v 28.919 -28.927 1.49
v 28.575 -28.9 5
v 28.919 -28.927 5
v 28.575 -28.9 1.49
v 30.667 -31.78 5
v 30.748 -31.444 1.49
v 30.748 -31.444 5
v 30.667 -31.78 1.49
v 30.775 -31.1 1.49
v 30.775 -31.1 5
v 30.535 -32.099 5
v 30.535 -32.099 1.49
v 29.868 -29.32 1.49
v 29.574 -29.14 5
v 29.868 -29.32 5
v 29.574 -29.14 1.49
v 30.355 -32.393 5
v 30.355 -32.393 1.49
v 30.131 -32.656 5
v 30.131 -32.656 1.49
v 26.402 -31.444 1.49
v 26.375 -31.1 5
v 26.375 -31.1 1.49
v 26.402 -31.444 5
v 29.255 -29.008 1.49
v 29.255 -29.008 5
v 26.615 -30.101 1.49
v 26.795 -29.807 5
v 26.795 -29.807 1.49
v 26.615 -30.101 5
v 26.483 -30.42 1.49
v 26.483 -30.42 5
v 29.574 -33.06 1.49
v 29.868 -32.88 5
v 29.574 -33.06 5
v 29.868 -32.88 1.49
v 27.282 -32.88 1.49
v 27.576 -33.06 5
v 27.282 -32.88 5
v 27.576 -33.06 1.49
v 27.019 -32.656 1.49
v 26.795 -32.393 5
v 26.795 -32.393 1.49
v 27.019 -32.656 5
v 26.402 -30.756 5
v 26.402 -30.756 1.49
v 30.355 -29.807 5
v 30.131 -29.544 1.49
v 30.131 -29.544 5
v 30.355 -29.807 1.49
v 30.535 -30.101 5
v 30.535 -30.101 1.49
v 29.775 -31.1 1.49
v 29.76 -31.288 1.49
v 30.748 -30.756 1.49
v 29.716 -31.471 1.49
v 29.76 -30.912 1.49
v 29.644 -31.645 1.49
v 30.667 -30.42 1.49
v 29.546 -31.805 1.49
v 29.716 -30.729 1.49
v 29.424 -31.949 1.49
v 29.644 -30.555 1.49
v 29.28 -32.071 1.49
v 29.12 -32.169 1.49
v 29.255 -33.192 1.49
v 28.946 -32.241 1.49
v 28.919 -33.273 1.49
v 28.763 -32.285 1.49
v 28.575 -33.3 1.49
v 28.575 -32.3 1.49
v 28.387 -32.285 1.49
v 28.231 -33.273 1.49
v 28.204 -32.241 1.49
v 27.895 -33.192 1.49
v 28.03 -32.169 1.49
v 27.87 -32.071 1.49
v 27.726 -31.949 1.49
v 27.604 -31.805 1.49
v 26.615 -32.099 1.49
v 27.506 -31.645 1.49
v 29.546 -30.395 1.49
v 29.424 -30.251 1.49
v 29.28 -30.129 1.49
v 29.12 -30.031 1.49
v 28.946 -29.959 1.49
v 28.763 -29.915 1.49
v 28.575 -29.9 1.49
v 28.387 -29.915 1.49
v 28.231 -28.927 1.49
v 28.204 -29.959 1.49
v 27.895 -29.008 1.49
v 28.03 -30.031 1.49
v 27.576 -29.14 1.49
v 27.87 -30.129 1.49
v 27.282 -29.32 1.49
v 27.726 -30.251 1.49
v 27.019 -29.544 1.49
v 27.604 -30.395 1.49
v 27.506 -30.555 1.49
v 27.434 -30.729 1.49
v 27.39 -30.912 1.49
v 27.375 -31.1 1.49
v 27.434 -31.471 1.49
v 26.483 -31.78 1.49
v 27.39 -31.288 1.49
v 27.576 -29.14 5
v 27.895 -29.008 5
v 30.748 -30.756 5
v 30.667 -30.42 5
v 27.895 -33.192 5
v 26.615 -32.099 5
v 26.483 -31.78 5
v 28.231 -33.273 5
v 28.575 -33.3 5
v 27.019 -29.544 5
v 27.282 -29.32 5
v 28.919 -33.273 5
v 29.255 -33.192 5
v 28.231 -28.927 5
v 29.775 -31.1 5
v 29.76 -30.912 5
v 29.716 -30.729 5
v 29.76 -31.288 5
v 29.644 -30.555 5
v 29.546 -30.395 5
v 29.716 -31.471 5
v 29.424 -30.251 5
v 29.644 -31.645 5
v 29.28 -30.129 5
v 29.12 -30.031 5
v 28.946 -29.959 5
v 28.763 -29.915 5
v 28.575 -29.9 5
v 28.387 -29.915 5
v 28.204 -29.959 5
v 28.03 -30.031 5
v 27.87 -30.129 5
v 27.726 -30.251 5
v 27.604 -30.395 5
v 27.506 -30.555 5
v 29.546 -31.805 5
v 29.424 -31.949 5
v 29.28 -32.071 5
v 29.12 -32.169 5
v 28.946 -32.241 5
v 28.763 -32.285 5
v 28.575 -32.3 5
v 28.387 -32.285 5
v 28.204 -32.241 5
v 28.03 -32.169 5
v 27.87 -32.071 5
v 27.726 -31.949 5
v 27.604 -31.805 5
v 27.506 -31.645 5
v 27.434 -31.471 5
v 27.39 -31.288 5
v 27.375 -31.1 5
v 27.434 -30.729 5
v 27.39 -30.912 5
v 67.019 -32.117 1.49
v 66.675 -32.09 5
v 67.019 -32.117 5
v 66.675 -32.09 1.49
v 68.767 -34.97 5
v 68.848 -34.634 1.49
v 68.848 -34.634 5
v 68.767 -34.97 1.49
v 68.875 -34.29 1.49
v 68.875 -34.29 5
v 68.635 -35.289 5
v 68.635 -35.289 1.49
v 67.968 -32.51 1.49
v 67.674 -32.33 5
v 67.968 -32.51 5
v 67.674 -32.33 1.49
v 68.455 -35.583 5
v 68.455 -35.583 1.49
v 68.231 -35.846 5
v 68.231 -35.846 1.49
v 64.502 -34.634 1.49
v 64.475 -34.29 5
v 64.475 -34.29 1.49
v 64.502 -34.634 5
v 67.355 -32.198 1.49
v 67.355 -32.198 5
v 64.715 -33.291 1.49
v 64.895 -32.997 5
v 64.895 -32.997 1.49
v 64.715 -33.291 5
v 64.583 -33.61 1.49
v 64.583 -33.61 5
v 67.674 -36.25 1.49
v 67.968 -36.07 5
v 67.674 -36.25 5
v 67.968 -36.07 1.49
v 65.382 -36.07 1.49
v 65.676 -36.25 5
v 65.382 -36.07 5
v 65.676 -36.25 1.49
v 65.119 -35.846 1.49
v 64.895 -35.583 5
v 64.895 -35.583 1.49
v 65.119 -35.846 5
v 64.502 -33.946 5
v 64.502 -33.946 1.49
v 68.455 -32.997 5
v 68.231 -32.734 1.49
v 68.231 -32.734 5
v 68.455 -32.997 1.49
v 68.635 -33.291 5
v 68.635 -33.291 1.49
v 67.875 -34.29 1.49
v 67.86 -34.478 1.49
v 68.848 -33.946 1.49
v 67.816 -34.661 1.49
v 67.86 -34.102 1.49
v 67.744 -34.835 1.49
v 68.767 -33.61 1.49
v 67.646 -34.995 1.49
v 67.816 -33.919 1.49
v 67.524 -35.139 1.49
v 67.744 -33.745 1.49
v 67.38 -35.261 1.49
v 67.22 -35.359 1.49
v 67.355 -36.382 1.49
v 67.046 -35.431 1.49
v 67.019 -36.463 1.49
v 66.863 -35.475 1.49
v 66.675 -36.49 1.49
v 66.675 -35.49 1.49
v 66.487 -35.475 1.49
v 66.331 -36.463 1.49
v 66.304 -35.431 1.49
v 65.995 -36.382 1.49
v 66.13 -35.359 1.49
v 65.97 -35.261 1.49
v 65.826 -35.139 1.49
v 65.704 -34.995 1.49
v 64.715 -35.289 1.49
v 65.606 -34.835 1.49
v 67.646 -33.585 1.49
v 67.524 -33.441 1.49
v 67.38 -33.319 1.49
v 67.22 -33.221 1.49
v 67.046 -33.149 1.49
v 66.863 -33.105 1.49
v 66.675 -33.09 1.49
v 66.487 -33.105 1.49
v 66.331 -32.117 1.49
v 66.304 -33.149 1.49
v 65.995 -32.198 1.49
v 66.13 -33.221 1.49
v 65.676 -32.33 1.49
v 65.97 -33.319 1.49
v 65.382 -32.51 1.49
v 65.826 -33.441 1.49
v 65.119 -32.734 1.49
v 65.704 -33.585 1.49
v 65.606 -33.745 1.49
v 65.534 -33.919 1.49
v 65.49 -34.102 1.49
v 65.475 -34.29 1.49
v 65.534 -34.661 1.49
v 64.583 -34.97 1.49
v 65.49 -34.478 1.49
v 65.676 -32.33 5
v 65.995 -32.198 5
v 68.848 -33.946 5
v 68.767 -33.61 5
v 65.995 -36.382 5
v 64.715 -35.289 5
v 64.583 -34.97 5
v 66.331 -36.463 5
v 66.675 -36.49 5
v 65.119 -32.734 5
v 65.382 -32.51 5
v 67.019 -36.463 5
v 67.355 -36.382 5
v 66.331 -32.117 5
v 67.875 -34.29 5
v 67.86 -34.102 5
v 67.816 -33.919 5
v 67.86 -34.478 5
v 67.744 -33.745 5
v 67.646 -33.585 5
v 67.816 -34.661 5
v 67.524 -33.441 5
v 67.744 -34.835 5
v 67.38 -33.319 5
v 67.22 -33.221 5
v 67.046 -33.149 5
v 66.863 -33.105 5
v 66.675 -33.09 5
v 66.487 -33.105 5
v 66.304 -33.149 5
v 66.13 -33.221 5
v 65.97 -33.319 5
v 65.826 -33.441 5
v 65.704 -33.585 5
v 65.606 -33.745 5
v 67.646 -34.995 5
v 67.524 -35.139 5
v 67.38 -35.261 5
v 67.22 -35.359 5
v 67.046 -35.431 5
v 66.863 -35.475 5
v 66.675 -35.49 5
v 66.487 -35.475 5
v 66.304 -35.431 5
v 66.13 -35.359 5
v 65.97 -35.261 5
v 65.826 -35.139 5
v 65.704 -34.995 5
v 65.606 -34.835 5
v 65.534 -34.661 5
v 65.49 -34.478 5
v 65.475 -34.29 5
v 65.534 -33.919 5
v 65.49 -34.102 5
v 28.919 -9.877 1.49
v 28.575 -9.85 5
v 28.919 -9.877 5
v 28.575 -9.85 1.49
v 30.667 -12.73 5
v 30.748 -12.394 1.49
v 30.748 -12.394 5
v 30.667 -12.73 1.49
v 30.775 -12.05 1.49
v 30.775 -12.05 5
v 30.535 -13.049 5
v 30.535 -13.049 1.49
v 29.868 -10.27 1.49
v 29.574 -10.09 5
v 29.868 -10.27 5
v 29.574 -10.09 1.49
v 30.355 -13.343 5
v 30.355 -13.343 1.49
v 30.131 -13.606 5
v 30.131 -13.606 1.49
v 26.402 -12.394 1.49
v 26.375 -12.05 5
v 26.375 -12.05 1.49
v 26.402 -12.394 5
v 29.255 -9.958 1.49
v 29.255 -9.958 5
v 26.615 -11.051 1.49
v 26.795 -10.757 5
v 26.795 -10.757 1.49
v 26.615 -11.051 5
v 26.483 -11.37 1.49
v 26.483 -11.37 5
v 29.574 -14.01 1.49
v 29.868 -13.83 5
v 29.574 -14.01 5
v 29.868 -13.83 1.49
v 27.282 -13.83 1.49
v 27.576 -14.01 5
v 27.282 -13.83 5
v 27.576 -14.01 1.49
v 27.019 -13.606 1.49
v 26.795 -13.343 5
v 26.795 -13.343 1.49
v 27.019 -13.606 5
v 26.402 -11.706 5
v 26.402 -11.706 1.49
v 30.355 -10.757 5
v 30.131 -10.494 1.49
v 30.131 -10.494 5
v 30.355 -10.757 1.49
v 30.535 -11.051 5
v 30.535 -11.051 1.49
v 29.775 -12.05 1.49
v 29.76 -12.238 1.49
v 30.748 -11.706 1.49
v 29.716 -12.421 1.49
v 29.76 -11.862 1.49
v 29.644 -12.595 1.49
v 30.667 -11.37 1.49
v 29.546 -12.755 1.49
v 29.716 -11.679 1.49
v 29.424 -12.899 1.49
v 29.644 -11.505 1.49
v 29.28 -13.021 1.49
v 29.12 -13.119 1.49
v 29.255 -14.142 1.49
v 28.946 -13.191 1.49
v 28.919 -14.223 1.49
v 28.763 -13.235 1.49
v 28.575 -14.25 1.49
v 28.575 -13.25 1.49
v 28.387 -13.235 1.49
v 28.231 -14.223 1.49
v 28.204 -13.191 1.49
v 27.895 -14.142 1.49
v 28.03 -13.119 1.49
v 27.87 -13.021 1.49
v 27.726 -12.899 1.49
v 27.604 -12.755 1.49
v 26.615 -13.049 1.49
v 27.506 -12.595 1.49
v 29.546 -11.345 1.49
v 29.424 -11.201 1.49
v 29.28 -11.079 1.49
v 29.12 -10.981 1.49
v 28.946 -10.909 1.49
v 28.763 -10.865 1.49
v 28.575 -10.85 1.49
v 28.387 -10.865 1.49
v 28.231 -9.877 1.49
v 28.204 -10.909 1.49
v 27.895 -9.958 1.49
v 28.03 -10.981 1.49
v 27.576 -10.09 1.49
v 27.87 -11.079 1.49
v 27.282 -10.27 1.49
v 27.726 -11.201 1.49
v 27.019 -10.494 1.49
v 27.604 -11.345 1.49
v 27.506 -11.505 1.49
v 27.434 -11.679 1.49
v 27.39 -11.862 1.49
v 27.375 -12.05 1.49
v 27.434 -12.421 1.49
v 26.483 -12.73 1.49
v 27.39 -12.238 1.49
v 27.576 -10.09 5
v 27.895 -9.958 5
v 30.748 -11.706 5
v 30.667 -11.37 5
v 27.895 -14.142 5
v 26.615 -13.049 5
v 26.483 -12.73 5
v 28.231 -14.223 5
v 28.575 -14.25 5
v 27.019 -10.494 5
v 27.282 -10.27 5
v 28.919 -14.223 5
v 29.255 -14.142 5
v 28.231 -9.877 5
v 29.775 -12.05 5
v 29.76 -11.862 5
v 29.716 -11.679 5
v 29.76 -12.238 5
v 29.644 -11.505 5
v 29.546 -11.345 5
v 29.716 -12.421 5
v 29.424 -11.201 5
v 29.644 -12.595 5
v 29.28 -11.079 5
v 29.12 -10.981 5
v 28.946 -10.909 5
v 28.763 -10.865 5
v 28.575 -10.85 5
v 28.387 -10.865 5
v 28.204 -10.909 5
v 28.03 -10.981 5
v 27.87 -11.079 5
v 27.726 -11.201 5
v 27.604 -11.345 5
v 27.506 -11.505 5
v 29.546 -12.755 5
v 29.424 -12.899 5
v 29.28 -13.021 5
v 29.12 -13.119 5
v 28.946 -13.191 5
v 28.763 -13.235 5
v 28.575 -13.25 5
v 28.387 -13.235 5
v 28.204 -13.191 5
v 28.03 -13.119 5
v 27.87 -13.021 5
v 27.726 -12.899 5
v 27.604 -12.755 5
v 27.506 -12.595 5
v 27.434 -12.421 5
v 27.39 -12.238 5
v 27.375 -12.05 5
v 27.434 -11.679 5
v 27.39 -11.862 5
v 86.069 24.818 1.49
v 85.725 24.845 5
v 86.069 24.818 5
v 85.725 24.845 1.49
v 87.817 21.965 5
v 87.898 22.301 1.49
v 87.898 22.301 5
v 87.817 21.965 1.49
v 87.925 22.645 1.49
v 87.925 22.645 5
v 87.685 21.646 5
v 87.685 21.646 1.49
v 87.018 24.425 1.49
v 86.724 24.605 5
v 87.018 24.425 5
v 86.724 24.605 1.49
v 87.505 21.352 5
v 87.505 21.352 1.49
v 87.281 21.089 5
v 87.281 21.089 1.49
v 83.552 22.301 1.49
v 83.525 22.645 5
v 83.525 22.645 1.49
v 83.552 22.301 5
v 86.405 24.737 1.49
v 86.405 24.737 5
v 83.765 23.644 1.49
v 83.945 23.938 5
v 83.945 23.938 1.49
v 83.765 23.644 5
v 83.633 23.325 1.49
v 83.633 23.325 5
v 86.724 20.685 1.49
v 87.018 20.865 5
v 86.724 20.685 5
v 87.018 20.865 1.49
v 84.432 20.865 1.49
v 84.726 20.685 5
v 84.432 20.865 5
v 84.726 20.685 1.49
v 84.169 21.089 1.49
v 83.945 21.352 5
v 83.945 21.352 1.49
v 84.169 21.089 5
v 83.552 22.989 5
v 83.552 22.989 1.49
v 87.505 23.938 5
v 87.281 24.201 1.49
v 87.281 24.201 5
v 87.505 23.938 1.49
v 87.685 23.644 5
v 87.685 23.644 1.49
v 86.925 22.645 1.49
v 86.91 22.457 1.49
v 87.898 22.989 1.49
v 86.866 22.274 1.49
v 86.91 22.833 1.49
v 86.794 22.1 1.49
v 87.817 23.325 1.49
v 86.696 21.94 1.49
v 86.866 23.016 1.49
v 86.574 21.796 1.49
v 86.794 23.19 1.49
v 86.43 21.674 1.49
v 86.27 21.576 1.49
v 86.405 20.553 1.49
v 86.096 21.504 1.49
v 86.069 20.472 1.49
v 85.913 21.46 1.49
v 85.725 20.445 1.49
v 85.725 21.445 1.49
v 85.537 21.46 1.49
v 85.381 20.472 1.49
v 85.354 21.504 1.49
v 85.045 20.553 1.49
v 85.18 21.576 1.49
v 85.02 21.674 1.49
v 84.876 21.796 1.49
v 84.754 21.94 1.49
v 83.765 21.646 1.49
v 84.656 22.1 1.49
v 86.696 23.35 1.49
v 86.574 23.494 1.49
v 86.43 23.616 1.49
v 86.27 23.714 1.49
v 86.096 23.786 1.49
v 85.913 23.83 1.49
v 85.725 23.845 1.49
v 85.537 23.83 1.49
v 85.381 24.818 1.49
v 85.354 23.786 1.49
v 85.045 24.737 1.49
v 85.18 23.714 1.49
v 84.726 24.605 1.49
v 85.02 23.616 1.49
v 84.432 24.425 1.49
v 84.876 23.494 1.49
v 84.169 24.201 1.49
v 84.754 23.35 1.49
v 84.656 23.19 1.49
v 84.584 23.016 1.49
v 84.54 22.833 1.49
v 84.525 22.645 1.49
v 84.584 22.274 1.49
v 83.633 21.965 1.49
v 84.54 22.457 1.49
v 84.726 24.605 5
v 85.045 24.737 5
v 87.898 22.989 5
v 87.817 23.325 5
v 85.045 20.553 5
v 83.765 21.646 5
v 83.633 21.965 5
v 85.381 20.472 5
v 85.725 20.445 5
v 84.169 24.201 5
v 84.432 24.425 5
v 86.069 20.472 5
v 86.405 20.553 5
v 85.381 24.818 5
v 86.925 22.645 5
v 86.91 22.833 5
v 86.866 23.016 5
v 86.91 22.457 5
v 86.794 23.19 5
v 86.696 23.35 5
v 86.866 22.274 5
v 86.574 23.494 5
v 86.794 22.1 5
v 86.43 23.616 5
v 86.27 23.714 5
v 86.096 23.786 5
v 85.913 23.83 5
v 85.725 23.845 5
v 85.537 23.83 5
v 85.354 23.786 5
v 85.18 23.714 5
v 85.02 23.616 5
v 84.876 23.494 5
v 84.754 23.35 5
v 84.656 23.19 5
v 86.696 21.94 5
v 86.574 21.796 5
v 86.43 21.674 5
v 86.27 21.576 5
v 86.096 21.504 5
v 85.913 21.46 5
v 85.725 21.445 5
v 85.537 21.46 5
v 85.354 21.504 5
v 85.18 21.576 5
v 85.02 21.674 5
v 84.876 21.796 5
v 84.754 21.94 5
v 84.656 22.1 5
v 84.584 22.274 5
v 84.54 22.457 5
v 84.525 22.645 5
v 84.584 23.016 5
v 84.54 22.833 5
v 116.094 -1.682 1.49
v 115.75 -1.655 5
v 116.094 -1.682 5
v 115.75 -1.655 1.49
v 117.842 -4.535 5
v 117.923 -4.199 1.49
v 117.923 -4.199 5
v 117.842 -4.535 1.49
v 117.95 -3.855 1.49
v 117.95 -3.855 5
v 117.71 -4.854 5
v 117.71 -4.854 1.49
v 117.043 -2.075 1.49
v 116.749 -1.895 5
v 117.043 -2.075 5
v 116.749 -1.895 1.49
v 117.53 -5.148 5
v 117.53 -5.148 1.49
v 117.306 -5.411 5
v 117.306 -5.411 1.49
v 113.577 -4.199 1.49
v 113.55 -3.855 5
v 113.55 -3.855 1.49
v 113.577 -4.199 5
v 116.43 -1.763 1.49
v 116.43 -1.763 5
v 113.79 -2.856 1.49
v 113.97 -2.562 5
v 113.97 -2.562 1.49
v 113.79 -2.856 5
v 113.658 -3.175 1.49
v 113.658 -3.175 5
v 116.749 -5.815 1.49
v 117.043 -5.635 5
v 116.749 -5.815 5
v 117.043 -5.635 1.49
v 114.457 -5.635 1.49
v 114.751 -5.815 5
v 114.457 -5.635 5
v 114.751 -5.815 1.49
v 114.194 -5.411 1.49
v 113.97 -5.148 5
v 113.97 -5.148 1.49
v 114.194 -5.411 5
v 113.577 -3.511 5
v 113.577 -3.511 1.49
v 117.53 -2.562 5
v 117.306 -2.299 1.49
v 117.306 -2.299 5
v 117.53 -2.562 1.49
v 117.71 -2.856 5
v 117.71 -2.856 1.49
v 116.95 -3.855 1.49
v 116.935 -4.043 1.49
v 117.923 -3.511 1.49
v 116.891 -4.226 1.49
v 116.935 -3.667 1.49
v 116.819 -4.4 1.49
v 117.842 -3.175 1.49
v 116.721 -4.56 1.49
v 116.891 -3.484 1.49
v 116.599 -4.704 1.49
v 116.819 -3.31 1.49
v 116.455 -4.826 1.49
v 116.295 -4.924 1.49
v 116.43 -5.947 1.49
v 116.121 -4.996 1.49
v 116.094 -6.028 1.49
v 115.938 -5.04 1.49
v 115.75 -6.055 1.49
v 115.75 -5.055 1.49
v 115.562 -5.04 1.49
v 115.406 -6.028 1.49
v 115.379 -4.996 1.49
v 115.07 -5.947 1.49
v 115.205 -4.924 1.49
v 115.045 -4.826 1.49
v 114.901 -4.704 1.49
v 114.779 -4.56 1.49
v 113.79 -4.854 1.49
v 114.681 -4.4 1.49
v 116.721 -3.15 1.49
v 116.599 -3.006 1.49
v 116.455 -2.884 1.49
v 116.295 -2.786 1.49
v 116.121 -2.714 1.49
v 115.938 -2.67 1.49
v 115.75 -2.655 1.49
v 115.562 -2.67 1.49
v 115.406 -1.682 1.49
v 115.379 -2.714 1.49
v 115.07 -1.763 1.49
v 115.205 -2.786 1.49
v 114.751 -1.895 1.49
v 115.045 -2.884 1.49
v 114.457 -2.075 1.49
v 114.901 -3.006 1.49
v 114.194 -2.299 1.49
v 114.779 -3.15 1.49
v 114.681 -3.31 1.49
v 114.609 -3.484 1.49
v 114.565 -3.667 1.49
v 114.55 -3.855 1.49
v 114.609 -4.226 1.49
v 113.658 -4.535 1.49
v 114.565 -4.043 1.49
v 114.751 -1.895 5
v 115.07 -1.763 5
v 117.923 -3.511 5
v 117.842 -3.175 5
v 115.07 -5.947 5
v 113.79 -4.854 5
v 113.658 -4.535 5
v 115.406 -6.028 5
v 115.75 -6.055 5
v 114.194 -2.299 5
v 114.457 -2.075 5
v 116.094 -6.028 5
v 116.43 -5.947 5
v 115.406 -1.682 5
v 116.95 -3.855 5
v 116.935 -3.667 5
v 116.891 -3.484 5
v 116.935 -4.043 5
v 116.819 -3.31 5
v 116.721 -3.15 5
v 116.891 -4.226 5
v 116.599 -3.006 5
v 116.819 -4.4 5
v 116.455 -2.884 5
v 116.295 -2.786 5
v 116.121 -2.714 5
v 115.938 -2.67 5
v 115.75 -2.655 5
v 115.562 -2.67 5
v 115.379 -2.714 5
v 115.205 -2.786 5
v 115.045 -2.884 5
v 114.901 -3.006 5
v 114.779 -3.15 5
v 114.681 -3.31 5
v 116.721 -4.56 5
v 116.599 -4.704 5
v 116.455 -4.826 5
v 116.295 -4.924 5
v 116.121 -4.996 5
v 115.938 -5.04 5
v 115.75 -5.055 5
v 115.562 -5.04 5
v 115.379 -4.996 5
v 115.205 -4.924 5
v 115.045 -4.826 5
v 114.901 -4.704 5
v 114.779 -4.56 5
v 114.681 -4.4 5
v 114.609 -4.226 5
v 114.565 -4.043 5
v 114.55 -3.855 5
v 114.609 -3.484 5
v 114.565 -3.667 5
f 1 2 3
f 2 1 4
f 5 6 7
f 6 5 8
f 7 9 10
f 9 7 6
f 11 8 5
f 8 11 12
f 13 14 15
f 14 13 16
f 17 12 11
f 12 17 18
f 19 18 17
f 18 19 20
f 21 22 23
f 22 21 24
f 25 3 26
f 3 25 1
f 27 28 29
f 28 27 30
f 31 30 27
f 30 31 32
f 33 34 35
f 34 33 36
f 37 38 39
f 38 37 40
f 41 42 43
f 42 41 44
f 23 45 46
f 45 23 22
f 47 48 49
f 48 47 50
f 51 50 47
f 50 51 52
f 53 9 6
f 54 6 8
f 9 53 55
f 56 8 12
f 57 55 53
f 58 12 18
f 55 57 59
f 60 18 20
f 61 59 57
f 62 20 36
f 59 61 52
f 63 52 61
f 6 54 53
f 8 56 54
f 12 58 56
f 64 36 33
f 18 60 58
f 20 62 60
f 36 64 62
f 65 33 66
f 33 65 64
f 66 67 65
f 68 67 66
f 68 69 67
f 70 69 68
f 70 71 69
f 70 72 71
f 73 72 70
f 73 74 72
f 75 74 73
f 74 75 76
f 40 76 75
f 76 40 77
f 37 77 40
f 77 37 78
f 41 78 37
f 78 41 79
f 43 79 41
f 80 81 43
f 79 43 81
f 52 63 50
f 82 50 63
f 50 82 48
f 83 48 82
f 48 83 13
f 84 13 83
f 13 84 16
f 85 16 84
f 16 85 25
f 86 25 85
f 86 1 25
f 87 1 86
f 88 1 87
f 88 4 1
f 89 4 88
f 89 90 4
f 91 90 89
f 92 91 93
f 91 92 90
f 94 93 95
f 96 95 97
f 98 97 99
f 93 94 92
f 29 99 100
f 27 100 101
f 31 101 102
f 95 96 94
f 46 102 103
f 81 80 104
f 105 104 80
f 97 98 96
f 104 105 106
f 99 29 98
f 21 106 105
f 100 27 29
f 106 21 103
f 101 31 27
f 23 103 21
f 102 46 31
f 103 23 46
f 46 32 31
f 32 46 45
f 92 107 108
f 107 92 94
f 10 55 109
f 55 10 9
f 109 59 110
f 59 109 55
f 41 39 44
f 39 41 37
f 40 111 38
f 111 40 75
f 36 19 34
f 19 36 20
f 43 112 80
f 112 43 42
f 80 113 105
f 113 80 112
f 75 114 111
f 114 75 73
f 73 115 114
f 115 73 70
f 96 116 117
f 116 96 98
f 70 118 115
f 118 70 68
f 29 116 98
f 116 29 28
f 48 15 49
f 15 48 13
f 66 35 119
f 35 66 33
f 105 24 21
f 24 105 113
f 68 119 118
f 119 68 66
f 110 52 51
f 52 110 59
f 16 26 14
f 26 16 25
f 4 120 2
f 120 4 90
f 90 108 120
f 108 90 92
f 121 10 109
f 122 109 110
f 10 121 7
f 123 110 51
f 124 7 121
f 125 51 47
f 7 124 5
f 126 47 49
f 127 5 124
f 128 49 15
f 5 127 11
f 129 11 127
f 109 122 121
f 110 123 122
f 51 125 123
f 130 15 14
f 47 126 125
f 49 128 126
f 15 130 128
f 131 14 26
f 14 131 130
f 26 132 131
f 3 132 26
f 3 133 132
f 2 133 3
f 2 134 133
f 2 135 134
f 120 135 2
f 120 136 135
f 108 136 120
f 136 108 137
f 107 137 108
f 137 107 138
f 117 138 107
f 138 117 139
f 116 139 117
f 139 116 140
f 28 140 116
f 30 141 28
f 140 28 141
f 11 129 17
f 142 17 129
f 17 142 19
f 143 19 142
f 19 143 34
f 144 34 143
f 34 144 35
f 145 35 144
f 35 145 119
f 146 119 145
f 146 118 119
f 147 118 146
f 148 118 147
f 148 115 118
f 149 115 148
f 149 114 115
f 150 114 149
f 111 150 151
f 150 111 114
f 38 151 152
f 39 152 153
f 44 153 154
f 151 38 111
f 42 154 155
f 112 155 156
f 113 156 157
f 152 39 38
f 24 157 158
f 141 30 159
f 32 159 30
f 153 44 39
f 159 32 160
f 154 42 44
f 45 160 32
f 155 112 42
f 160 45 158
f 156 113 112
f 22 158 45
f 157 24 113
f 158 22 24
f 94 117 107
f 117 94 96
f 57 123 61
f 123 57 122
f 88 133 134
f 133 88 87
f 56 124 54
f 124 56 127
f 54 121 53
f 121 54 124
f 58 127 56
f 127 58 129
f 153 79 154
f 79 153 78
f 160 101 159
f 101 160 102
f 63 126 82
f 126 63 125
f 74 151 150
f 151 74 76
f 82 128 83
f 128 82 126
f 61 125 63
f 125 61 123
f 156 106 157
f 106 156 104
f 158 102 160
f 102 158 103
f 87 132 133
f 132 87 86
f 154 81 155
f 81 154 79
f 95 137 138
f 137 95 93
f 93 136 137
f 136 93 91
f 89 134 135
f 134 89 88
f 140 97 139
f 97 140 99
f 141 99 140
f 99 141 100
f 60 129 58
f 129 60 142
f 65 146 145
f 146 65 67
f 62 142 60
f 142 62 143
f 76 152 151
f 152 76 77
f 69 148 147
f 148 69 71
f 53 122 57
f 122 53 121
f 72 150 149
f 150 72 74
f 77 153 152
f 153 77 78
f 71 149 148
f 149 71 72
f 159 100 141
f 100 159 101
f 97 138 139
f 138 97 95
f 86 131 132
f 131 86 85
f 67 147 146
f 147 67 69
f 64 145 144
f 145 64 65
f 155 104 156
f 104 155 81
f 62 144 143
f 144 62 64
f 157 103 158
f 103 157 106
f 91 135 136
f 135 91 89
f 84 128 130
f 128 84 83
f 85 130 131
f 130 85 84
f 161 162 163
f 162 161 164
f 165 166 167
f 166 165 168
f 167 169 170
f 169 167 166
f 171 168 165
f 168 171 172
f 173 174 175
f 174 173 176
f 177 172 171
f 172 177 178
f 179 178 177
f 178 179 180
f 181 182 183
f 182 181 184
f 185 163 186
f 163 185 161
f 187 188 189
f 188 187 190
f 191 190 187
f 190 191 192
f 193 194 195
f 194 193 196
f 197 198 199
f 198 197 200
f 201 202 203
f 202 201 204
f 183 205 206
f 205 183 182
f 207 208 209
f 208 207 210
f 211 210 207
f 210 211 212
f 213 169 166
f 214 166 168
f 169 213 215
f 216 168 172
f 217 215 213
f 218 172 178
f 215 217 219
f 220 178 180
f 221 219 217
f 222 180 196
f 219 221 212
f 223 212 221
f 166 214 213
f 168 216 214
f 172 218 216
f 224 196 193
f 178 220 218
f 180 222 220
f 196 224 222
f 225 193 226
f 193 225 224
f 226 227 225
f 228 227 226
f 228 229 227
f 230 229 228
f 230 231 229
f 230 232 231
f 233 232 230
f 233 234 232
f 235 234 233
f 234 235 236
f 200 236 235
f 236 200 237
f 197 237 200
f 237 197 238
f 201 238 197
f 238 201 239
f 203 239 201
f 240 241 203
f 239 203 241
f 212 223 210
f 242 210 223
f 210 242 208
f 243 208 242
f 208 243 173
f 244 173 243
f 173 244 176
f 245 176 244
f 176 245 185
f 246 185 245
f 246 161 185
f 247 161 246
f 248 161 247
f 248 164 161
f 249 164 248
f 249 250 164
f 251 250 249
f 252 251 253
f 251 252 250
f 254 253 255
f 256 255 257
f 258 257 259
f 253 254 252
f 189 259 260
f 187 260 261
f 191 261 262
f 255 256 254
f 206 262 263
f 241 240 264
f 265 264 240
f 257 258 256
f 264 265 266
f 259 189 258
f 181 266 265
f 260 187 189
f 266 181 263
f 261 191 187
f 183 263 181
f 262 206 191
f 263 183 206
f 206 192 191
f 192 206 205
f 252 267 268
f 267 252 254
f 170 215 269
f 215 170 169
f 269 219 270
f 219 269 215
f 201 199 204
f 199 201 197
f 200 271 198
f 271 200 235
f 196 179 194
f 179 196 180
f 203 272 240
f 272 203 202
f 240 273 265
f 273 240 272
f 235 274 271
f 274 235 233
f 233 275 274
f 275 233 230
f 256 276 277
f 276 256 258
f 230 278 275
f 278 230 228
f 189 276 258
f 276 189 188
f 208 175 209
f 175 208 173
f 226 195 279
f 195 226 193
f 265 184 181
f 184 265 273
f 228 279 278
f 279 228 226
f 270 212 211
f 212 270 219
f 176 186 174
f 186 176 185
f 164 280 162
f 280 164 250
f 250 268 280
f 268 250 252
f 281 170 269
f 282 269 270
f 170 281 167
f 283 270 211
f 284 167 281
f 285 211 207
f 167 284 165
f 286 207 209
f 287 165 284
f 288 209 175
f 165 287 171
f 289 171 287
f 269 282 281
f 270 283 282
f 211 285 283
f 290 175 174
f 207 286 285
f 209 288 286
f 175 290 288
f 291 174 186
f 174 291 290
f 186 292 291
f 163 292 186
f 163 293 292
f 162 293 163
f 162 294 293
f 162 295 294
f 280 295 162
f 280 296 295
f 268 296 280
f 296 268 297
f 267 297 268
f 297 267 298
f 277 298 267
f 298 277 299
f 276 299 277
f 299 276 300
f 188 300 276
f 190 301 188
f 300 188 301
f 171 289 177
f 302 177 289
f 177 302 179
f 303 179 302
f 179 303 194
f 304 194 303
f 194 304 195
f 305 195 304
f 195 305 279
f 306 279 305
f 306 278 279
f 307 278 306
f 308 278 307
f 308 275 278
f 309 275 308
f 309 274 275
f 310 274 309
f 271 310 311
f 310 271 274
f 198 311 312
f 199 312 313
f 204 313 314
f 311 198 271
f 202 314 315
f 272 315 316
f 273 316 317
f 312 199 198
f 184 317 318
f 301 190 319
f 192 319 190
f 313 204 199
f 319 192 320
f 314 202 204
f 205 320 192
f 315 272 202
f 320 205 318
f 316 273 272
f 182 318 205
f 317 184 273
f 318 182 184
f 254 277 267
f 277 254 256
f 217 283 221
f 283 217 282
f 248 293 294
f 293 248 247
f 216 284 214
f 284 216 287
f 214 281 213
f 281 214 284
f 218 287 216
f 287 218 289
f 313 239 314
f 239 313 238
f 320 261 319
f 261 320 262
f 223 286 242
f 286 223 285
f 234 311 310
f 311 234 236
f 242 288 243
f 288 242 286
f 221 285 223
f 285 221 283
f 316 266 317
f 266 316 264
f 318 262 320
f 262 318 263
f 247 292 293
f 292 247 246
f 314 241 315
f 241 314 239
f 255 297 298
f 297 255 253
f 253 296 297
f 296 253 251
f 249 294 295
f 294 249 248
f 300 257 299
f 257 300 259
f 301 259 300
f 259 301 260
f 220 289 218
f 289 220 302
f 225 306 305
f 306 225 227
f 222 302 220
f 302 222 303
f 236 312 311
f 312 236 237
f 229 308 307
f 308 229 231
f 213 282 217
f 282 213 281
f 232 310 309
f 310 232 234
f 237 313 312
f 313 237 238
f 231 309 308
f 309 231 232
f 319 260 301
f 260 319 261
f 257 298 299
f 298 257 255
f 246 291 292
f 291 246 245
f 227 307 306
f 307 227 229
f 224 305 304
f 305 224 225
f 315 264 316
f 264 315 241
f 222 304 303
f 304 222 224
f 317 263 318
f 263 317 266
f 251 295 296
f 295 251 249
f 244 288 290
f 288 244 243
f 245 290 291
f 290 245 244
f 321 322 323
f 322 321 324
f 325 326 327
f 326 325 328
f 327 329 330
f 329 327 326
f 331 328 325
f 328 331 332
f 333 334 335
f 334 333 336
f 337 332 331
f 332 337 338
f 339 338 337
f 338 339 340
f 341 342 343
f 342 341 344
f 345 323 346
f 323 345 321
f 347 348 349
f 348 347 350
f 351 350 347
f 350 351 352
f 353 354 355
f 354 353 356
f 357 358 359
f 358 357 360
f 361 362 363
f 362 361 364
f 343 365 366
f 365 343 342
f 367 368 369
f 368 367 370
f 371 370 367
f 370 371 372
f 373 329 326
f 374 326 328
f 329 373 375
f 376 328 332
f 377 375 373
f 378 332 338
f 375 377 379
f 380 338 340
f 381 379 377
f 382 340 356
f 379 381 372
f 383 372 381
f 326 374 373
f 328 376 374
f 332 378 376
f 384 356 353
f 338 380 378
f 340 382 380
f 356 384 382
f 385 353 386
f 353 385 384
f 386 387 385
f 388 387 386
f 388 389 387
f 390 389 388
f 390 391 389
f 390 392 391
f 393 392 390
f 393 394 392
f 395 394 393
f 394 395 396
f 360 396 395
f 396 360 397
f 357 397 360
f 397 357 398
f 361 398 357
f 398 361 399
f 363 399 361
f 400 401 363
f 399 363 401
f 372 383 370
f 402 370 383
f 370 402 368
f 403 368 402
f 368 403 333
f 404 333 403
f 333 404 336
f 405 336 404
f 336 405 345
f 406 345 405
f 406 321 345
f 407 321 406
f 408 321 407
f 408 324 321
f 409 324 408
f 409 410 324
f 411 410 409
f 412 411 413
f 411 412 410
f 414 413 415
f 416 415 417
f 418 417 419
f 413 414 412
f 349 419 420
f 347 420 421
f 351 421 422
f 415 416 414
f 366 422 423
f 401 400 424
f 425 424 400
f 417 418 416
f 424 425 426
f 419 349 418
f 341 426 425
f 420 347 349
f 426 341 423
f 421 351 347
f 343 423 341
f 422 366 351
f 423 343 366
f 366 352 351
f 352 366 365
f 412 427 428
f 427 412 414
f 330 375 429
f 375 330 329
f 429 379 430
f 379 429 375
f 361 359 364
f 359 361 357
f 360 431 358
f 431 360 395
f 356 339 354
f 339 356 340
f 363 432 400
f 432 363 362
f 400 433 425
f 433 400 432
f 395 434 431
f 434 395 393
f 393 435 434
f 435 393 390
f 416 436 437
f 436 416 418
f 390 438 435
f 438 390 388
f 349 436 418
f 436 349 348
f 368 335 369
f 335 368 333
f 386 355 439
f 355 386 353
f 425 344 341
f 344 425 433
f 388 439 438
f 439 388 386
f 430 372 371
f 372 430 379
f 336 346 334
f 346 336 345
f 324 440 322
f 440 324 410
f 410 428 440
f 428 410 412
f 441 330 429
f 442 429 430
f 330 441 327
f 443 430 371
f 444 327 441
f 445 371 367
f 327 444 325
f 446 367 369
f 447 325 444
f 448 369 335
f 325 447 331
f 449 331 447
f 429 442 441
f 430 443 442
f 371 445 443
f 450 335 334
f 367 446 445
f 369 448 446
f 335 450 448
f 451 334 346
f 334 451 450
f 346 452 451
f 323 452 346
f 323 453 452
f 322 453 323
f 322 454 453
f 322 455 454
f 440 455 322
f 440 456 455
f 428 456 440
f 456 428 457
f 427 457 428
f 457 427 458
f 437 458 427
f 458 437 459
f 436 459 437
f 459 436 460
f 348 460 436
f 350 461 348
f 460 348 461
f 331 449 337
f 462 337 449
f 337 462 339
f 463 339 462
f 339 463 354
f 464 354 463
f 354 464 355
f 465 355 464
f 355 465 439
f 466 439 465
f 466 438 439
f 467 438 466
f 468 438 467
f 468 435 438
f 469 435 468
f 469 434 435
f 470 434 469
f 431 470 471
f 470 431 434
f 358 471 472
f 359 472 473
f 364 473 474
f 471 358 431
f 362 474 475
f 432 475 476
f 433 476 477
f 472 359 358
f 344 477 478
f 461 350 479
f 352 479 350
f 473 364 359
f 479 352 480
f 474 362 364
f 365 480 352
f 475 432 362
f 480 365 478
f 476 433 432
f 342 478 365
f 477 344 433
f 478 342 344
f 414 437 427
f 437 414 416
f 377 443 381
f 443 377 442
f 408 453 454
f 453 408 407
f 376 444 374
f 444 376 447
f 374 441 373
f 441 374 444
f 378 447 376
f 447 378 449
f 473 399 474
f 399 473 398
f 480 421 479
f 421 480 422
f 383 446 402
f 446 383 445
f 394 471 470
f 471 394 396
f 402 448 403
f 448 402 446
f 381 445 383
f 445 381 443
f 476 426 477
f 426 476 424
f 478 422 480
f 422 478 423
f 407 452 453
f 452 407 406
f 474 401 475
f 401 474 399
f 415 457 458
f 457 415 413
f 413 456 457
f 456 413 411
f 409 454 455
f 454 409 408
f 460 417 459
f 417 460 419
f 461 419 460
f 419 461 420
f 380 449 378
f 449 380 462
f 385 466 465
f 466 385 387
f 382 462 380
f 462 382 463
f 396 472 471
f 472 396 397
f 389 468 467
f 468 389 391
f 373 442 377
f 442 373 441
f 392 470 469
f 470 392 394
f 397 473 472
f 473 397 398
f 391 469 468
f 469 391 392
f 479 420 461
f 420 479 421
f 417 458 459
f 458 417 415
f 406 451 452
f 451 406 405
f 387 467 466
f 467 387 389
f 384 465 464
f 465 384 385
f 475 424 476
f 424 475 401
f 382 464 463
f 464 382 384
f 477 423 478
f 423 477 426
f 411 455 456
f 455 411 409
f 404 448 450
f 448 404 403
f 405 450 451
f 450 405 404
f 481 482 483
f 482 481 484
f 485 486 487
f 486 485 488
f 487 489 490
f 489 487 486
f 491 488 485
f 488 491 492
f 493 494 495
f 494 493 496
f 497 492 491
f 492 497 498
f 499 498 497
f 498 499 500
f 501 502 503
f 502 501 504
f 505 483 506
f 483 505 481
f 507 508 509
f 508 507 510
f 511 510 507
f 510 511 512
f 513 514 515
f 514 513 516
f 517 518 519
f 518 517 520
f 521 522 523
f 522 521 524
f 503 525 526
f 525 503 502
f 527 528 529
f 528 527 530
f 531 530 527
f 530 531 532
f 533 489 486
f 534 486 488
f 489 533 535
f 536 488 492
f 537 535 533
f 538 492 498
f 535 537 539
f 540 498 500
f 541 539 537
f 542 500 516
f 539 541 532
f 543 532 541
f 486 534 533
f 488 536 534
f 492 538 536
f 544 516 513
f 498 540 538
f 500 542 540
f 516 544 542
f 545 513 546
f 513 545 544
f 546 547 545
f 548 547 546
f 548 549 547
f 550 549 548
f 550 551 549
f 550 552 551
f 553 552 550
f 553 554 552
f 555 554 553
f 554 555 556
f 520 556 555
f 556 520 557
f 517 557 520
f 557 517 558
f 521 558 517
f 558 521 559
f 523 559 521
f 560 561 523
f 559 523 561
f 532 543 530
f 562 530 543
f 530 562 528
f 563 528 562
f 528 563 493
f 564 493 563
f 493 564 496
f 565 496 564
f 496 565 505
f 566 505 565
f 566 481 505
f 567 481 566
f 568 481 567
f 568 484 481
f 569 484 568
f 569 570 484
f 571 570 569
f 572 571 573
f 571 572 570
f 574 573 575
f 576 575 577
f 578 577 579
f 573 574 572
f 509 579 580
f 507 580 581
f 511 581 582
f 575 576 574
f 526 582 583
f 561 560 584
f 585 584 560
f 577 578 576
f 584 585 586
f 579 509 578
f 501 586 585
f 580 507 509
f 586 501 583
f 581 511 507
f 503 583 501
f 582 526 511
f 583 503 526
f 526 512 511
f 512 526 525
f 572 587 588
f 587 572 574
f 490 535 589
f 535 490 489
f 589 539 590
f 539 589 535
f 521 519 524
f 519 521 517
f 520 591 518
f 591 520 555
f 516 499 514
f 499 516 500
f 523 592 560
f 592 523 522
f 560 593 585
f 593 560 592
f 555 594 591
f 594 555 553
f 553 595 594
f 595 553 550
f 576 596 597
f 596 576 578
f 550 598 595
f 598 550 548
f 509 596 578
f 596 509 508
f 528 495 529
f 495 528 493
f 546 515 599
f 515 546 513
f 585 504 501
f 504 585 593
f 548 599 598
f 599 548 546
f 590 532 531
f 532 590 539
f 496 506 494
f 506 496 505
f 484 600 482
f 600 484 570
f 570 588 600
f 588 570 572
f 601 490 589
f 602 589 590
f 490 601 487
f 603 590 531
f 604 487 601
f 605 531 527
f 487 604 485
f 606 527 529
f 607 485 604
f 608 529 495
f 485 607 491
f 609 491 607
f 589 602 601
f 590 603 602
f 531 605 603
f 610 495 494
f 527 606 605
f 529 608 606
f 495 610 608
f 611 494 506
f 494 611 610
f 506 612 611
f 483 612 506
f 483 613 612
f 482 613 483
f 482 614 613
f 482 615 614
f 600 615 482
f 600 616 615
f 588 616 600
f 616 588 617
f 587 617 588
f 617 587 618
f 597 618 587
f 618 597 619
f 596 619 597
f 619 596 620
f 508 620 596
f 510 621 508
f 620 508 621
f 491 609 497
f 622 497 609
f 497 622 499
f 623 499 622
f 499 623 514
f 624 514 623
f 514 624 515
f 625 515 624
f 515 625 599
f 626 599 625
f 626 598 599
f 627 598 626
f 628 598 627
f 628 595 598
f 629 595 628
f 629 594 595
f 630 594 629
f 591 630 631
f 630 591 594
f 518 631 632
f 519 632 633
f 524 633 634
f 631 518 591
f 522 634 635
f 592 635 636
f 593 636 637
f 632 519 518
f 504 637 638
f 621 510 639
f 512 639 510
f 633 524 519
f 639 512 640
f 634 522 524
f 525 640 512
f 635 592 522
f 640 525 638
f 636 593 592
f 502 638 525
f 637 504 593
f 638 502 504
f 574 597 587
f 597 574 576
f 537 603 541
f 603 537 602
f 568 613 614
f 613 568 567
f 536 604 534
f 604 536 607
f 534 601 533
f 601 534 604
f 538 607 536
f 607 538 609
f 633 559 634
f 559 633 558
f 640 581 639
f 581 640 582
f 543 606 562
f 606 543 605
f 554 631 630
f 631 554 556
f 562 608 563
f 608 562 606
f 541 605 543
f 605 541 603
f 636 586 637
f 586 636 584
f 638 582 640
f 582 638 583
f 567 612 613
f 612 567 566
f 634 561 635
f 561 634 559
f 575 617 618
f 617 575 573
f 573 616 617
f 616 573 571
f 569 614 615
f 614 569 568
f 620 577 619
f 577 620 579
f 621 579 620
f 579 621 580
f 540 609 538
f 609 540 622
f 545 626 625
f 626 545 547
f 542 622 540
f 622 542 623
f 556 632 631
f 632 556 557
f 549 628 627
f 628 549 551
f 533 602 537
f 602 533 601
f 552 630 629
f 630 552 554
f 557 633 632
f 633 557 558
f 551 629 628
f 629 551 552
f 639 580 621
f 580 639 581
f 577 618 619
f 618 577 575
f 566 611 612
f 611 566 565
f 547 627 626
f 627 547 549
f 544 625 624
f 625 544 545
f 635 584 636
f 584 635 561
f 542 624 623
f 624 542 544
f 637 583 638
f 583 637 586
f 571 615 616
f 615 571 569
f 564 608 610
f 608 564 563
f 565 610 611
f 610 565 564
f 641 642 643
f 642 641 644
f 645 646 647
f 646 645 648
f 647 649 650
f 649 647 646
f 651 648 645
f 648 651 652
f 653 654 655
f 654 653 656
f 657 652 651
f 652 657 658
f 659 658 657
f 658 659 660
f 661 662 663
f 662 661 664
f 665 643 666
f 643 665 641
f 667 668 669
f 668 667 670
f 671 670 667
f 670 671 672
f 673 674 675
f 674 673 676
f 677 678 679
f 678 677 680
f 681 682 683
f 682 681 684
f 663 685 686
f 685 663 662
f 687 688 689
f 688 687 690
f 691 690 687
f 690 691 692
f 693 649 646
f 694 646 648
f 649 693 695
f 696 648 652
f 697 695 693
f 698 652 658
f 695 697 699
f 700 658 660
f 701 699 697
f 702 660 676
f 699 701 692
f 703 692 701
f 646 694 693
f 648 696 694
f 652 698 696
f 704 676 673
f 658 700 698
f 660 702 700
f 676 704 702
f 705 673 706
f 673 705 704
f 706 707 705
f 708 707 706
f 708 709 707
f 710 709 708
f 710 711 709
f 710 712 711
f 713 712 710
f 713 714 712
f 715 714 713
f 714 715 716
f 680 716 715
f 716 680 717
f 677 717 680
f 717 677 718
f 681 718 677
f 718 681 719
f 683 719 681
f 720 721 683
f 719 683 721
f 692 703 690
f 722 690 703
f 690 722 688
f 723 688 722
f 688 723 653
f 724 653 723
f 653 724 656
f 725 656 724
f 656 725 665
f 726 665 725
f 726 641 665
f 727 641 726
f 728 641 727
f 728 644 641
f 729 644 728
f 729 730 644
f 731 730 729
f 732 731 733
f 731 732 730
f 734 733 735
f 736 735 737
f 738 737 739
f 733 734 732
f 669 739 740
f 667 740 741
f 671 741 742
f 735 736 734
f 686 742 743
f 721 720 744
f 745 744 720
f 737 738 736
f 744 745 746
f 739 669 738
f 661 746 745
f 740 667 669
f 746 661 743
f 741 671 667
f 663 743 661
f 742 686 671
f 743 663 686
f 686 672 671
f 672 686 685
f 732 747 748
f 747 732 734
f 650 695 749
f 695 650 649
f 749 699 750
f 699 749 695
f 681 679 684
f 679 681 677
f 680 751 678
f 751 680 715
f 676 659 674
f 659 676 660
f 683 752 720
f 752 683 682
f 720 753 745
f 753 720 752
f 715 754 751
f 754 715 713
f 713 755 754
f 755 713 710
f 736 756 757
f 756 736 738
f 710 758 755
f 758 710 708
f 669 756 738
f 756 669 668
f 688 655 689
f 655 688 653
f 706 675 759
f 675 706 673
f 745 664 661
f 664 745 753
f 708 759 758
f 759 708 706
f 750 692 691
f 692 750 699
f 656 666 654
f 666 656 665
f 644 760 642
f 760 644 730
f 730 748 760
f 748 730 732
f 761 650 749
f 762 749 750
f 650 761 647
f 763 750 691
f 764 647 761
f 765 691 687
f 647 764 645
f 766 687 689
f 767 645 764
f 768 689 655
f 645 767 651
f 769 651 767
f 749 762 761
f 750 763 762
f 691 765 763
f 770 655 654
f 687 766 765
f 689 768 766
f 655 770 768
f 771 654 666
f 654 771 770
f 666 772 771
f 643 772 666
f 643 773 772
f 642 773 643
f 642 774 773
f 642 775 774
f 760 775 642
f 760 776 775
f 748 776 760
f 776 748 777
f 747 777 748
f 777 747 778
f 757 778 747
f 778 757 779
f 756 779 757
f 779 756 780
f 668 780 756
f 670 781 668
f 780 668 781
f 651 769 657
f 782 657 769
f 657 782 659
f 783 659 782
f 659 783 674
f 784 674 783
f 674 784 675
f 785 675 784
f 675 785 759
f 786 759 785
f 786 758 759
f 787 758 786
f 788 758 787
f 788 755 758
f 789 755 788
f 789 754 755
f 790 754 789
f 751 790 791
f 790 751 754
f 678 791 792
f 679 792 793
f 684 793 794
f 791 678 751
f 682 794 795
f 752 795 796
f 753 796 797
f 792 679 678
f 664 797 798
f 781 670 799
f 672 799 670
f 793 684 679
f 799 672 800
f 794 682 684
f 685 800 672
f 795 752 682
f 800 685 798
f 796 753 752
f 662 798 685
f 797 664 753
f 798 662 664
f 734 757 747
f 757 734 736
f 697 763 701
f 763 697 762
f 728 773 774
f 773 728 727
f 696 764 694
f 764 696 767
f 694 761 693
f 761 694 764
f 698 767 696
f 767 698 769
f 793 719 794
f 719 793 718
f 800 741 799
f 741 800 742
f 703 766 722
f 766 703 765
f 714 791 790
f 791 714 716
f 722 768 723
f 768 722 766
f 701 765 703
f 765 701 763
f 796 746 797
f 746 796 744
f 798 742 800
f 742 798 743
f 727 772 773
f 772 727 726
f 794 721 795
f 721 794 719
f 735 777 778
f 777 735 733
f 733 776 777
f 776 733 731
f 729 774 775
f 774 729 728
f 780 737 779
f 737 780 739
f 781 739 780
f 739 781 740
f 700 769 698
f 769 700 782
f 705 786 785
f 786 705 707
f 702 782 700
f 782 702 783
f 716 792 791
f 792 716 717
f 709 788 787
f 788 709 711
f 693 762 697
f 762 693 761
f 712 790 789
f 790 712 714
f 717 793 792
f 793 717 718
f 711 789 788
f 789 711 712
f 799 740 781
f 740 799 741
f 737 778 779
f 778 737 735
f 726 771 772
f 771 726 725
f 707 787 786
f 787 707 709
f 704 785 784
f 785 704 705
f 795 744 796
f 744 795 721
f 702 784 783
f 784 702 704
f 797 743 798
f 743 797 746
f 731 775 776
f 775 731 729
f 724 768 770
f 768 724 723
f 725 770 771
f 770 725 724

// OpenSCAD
// file: geometry.scad
// GENERATED by case/tools/gen_geometry.py. Do not edit by hand.
// Source: pcb/ergogen/preview/points.yaml and pcb/ergogen/config.yaml (Ergogen frame, mm, y up).
// Rotation r is Ergogen's (counter-clockwise positive), same as OpenSCAD rotate().

// [name, x, y, r]; 42-key = all, 36-key = without the matrix_outer_* column
keys_42 = [
  ["matrix_outer_bottom", 0, 0, 0],
  ["matrix_outer_home", 0, 19.05, 0],
  ["matrix_outer_top", 0, 38.1, 0],
  ["matrix_pinky_bottom", 19.05, 0, 0],
  ["matrix_pinky_home", 19.05, 19.05, 0],
  ["matrix_pinky_top", 19.05, 38.1, 0],
  ["matrix_ring_bottom", 38.1, 3.81, 0],
  ["matrix_ring_home", 38.1, 22.86, 0],
  ["matrix_ring_top", 38.1, 41.91, 0],
  ["matrix_middle_bottom", 57.15, 5.715, 0],
  ["matrix_middle_home", 57.15, 24.765, 0],
  ["matrix_middle_top", 57.15, 43.815, 0],
  ["thumbfan_near_thumb", 76.2, -17.145, 0],
  ["matrix_index_bottom", 76.2, 3.81, 0],
  ["matrix_index_home", 76.2, 22.86, 0],
  ["matrix_index_top", 76.2, 41.91, 0],
  ["thumbfan_mid_thumb", 95.25, -17.145, 0],
  ["matrix_inner_bottom", 95.25, 1.905, 0],
  ["matrix_inner_home", 95.25, 20.955, 0],
  ["matrix_inner_top", 95.25, 40.005, 0],
  ["thumbfan_far_thumb", 116.3, -12.3825, -15],
];
keys_36 = [
  ["matrix_pinky_bottom", 19.05, 0, 0],
  ["matrix_pinky_home", 19.05, 19.05, 0],
  ["matrix_pinky_top", 19.05, 38.1, 0],
  ["matrix_ring_bottom", 38.1, 3.81, 0],
  ["matrix_ring_home", 38.1, 22.86, 0],
  ["matrix_ring_top", 38.1, 41.91, 0],
  ["matrix_middle_bottom", 57.15, 5.715, 0],
  ["matrix_middle_home", 57.15, 24.765, 0],
  ["matrix_middle_top", 57.15, 43.815, 0],
  ["thumbfan_near_thumb", 76.2, -17.145, 0],
  ["matrix_index_bottom", 76.2, 3.81, 0],
  ["matrix_index_home", 76.2, 22.86, 0],
  ["matrix_index_top", 76.2, 41.91, 0],
  ["thumbfan_mid_thumb", 95.25, -17.145, 0],
  ["matrix_inner_bottom", 95.25, 1.905, 0],
  ["matrix_inner_home", 95.25, 20.955, 0],
  ["matrix_inner_top", 95.25, 40.005, 0],
  ["thumbfan_far_thumb", 116.3, -12.3825, -15],
];

// M2 mounting holes H1..H5 (centres)
holes = [[28.575, 31.1], [66.675, 34.29], [28.575, 12.05], [85.725, -22.645], [115.75, 3.855]];

ctrl_pos = [115.75, 34.505, 0];  // x, y, rotation
display_pos = [115.75, 11.855, 0];  // x, y, rotation
reset_pos = [128.35, 33.505, 90];  // x, y, rotation
pwr_pos = [131.55, 42.505, 90];  // x, y, rotation
jst_pos = [129.75, 24.505, 90];  // x, y, rotation

// B.Cu hot-swap pads in the key frame [x, y, w, h]: MX pad 1, MX pad 2, Choc pad 1, Choc pad 2
// (from switch_mx_choc_reversible.js; used for boss keep-outs, the Choc and MX sockets are both avoided)
socket_pads_b = [[7.085, -2.54, 2.55, 2.5], [-5.842, -5.08, 2.55, 2.5], [8.275, 3.75, 2.6, 2.6], [-3.275, 5.95, 2.6, 2.6]];

// PCB outline bounding box [xmin, xmax, ymin, ymax] of board_42.dxf (right edge = strip edge, for edge slots)
board_bbox = [-11.525, 134.75, -28.67, 55.34];

// Outline files, read in place from the WP4 preview/ copy (all share the Ergogen frame; see README)
dxf_dir = "../pcb/ergogen/preview/";
// main file
// Parametric case for the reversible Corne-layout board (WP6).
// OpenSCAD 2021.01 or newer.  Everything is in the Ergogen frame of WP4 (mm, y up, origin = centre of
// the outer-column bottom key), viewed from ABOVE the LEFT half (KiCad F side up).
//
//   openscad -D 'part="plate_42"' -o stl/plate_42.stl corne_case.scad
//
// part = plate_42 | plate_36 | plate_42_right | plate_36_right
//        tray_42_left | tray_36_left | tray_42_right | tray_36_right
//        test_plate_mx | test_plate_mx_tolerance
//        slice_* parts are 2D debug sections used by tools/check.py
//
// Outlines come from the WP4 Ergogen DXFs (../pcb/ergogen/preview/*.dxf, same frame as points.yaml, so no
// re-alignment is needed); key and hole positions come from geometry.scad (generated from points.yaml
// and config.yaml by tools/gen_geometry.py).

include <geometry.scad>

part = "plate_42";

// ---------------------------------------------------------------- switch type
switch_type = "mx";            // "mx" (deliverable) or "choc" (parameter set only, untested)

// MX
mx_cutout      = 14.0;         // square cutout
mx_plate_t     = 1.5;          // thickness at the clip
mx_above_pcb   = 5.0;          // PCB top to plate top
// Choc V1 (not exported, kept for a later plate)
choc_cutout    = 13.8;
choc_plate_t   = 1.2;          // 1.2 to 1.3
choc_above_pcb = 2.2;
diode_h        = 1.1;          // SOD-123 height; diode pockets only on the half where diodes face up (right)
diode_pocket   = [5.4, 3.2];   // pocket size, centred 9.525 mm below the key in the key frame

cutout_tol  = 0.0;             // added to the cutout size; tune after printing the test plate

is_mx       = switch_type == "mx";
cutout      = (is_mx ? mx_cutout : choc_cutout) + cutout_tol;
plate_t     = is_mx ? mx_plate_t : choc_plate_t;
above_pcb   = is_mx ? mx_above_pcb : choc_above_pcb;
post_h      = above_pcb - plate_t;       // plate underside to PCB top = length of the screw posts

// ---------------------------------------------------------------- PCB / tray
pcb_t       = 1.6;
wall        = 2.0;                       // must equal `wall` in pcb/ergogen/config.yaml (tray outline = PCB + wall)
fit         = 0.3;                       // cavity is the PCB outline + fit on every side
floor_t     = 2.0;                       // floor thickness
under_pcb   = 3.0;                       // floor top to PCB bottom, general area (>= 2.5 required)

// battery (task default 20 x 30 x 5; docs/bom.md cells are about 20 x 27-28 x 4.2-4.3)
batt_w = 20;  batt_l = 30;  batt_t = 5.0;
batt_clear  = 0.5;                       // on each side in xy
batt_top    = 0.5;                       // between battery top and PCB underside (socket tails, trim them)
batt_skin   = 0.8;                       // floor left under the battery pocket
usb_edge_y  = ctrl_pos[1] + 17;          // board top edge over the controller (Ergogen outline, = 51.505)
batt_top_gap = 1.0;                      // pocket top edge to that board edge
// Pocket pushed to the USB end of the controller, away from the antenna at the far end of the module.
// With batt_l = 30 it starts at y 19.5 (antenna end of the module at about 18 to 24); a 27 mm cell
// (batt_l = 27) starts at 22.5.
batt_cy     = usb_edge_y - batt_top_gap - batt_l / 2 - batt_clear;
assert(batt_cy + batt_l / 2 + batt_clear <= usb_edge_y - 0.5, "battery pocket reaches the tray wall");

// PCB underside level: either the general clearance or whatever the battery needs, whichever is larger
pcb_bottom  = max(floor_t + under_pcb, batt_skin + batt_t + batt_top);
wall_h      = pcb_bottom + pcb_t + post_h;   // wall top = plate underside
if (pcb_bottom - jst_h - 0.4 < batt_skin) echo("WARNING: JST housing is deeper than the floor pocket; check jst_h");

// M2 heat-set inserts and screws
boss_od     = 6.0;
pad_margin  = 0.25;                      // boss keeps this far from the socket pads (copper)
insert_d    = 3.2;                       // hole for an M2 insert of 3.5 mm OD (check your inserts)
insert_len  = 4.0;                       // insert length 3 to 4 mm
insert_deep = insert_len + 0.5;          // blind hole depth below the boss top
// WP7 moved H4 to 3.24 mm from the nearest socket pad, so it now takes an insert like H1-H3/H5.
// Set h4_insert = false to fall back to a 1.8 mm pilot hole for a self-tapping M2 screw.
h4_insert   = true;
h4_pilot_d  = 1.8;
hole_d      = [insert_d, insert_d, insert_d, h4_insert ? insert_d : h4_pilot_d, insert_d];
screw_clear = 2.4;                       // M2 clearance in plate and posts
post_od     = 4.4;                       // plate posts press the PCB onto the bosses
csk         = false;                     // true: countersink the plate screw holes (90 deg, 3.9 mm head)

// edge openings (all assumptions, see README)
usb_w       = 13.0;                      // USB-C plug overmould 12 plus clearance
usb_z0      = 1.0;                       // slot bottom above the PCB top
pwr_w       = 10.0;                      // MSK12C02 slide travel
pwr_h       = 4.0;                       // below the PCB
jst_w       = 10.0;                      // JST PH S2B-PH-K housing 8 wide plus clearance
jst_h       = 6.0;                       // housing height (unmeasured)

// reset button TS-1187A (face A, KiCad B)
reset_h       = 1.5;
reset_hole_d  = 3.0;                     // WP4 press hole diameter
reset_body    = [5.6, 7.5];              // courtyard in the world frame after the 90 degree rotation
reset_pillar  = true;                    // printed guide tube under the button so a pin can reach it
reset_pillar_od = 4.6;
reset_gap     = 0.3;                     // pillar top to button actuator

// plate windows
win_w       = 21.0;                      // controller / display window width, centred on the controller
win_bottom  = display_pos[1] - 3.25;     // below the nice!view header
win_top     = ctrl_pos[1] + 16.0;        // above the USB end of the module
reset_win_margin = 1.2;                  // added to the reset courtyard (right half only)

// test plates
test_pitch  = 19.05;
test_margin = 4.0;

$fn = 40;

function outline_file(kind, n) = str(dxf_dir, kind, "_", n, ".dxf");
module outline2d(kind, n) { import(outline_file(kind, n)); }

// ================================================================ plate
module cut_square(sz) { square(sz, center = true); }

module plate_windows(right) {
  // controller and nice!view
  translate([ctrl_pos[0] - win_w / 2, win_bottom]) square([win_w, win_top - win_bottom]);
  // USB-C notch through the top edge
  translate([ctrl_pos[0] - usb_w / 2, win_top - 0.1]) square([usb_w, 20]);
  // reset button faces UP on the right half: keep it uncovered
  if (right)
    translate([reset_pos[0], reset_pos[1]])
      square([reset_body[0] + 2 * reset_win_margin, reset_body[1] + 2 * reset_win_margin], center = true);
}

module plate2d(n, keys, right) {
  difference() {
    outline2d("tray", n);                                  // PCB outline + wall, as the tray
    for (k = keys) translate([k[1], k[2]]) rotate(k[3]) cut_square(cutout);
    for (h = holes) translate(h) circle(d = screw_clear);
    plate_windows(right);
  }
}

module screw_post() {
  difference() {
    translate([0, 0, 0]) cylinder(d = post_od, h = post_h + 0.01);
    translate([0, 0, -1]) cylinder(d = screw_clear, h = post_h + 2);
  }
}

// plate in ASSEMBLY orientation: top face at z = plate_t, posts below (z < 0), left-half view
module plate_assembly(n, keys, right) {
  difference() {
    union() {
      linear_extrude(plate_t) plate2d(n, keys, right);
      for (h = holes) translate([h[0], h[1], -post_h]) screw_post();
    }
    if (csk)
      for (h = holes) translate([h[0], h[1], plate_t - 1.0]) cylinder(d1 = screw_clear, d2 = 3.9 + 0.2, h = 1.01);
    // Choc only: diode pockets in the plate underside, right half (diodes face up)
    if (!is_mx && right)
      for (k = keys)
        translate([k[1], k[2], -0.01]) rotate(k[3]) translate([0, -9.525, 0])
          translate([-diode_pocket[0] / 2, -diode_pocket[1] / 2, 0])
            cube([diode_pocket[0], diode_pocket[1], max(0, diode_h + 0.2 - post_h) + 0.01]);
  }
}

// printed with the top face on the bed, posts up. The right half is the mirror image plus its reset window.
module plate_print(n, keys, right) {
  rotate([180, 0, 0]) translate([0, 0, -plate_t])
    if (right) mirror([1, 0, 0]) plate_assembly(n, keys, true);
    else plate_assembly(n, keys, false);
}

// ================================================================ tray
module tray_cavity2d(n) { offset(r = -(wall - fit)) outline2d("tray", n); }

// Sockets solder to the underside. Their pads are NOT mirrored between the halves (the switch pins are
// fixed in the world), so in the left-coordinate frame the right half's pads are the pattern mirrored in x.
module socket_keepout2d(keys, right) {
  for (k = keys) translate([k[1], k[2]]) rotate(k[3])
    if (right) mirror([1, 0]) socket_pads2d(); else socket_pads2d();
}
module socket_pads2d() {
  for (p = socket_pads_b) translate([p[0], p[1]]) offset(delta = pad_margin) square([p[2], p[3]], center = true);
}

// boss footprint: a disc with the socket pads (plus margin) bitten out of it
module boss2d(h, keys, right) {
  intersection() {
    translate(h) circle(d = boss_od);
    difference() {
      translate(h) square(boss_od + 2, center = true);
      socket_keepout2d(keys, right);
    }
  }
}

module tray_body(n, keys, right) {
  difference() {
    union() {
      linear_extrude(floor_t) outline2d("tray", n);
      linear_extrude(wall_h) difference() { outline2d("tray", n); tray_cavity2d(n); }
      for (h = holes) translate([0, 0, floor_t - 0.01]) linear_extrude(pcb_bottom - floor_t + 0.01) boss2d(h, keys, right);
      if (!right && reset_pillar)
        translate([reset_pos[0], reset_pos[1], floor_t - 0.01])
          cylinder(d = reset_pillar_od, h = pcb_bottom - reset_h - reset_gap - floor_t + 0.01);
    }
    // heat-set insert holes (open at the boss top)
    for (i = [0 : len(holes) - 1])
      translate([holes[i][0], holes[i][1], pcb_bottom - insert_deep]) cylinder(d = hole_d[i], h = insert_deep + 1);
    // battery pocket in the floor
    translate([ctrl_pos[0] - (batt_w + 2 * batt_clear) / 2, batt_cy - (batt_l + 2 * batt_clear) / 2, batt_skin])
      cube([batt_w + 2 * batt_clear, batt_l + 2 * batt_clear, floor_t]);
    // reset press hole (left half only: the button faces down)
    if (!right)
      translate([reset_pos[0], reset_pos[1], -1]) cylinder(d = reset_hole_d, h = pcb_bottom + 2);
    // USB-C: open at the top, towards +y
    translate([ctrl_pos[0] - usb_w / 2, ctrl_pos[1] + 12, pcb_bottom + pcb_t + usb_z0])
      cube([usb_w, 30, wall_h]);
    // power switch (right edge, underside of the PCB)
    translate([board_bbox[1] - 0.5, pwr_pos[1] - pwr_w / 2, pcb_bottom - pwr_h])
      cube([wall + 2, pwr_w, pwr_h + 0.2]);
    // JST connector (underside): pocket in the floor under the housing, then an opening in the right wall.
    // The wall opening runs through the floor if the housing is deeper than the floor allows (see README).
    translate([jst_pos[0] - 3.5, jst_pos[1] - jst_w / 2, max(batt_skin, pcb_bottom - jst_h - 0.4)])
      cube([board_bbox[1] - jst_pos[0] + 3.5, jst_w, pcb_bottom + 0.2 - max(batt_skin, pcb_bottom - jst_h - 0.4)]);
    translate([board_bbox[1] - 0.5, jst_pos[1] - jst_w / 2, max(-1, pcb_bottom - jst_h - 0.4)])
      cube([wall + 2, jst_w, pcb_bottom + 0.2 - max(-1, pcb_bottom - jst_h - 0.4)]);
  }
}

module tray_print(n, right) {
  keys = n == 42 ? keys_42 : keys_36;
  if (right) mirror([1, 0, 0]) tray_body(n, keys, true);
  else tray_body(n, keys, false);
}

// ================================================================ test plates
module test_plate(sizes, marks = false) {
  n = len(sizes);
  w = (n - 1) * test_pitch + 14 + 2 * test_margin;
  h = 14 + 2 * test_margin + (marks ? 5 : 0);
  y0 = -7 - test_margin - (marks ? 5 : 0);
  linear_extrude(plate_t) difference() {
    translate([-7 - test_margin, y0]) square([w, h]);
    for (i = [0 : n - 1]) {
      translate([i * test_pitch, 0]) square(sizes[i], center = true);
      // i + 1 small holes under cutout i identify the size (1 = smallest)
      if (marks)
        for (j = [0 : i]) translate([i * test_pitch + (j - i / 2) * 2.4, -7 - test_margin - 1]) circle(d = 1.2, $fn = 16);
    }
  }
}

// ================================================================ slices (2D debug sections for check.py)
module slice_plate(n, keys, right) {
  projection(cut = true) translate([0, 0, -plate_t / 2])
    if (right) mirror([1, 0, 0]) plate_assembly(n, keys, true);
    else plate_assembly(n, keys, false);
}
module slice_tray(n, right, z) {
  projection(cut = true) translate([0, 0, -z]) tray_print(n, right);
}

// ================================================================ dispatch
if (part == "plate_42")              plate_print(42, keys_42, false);
else if (part == "plate_36")         plate_print(36, keys_36, false);
else if (part == "plate_42_right")   plate_print(42, keys_42, true);
else if (part == "plate_36_right")   plate_print(36, keys_36, true);
else if (part == "tray_42_left")     tray_print(42, false);
else if (part == "tray_36_left")     tray_print(36, false);
else if (part == "tray_42_right")    tray_print(42, true);
else if (part == "tray_36_right")    tray_print(36, true);
else if (part == "test_plate_mx")           test_plate([mx_cutout + cutout_tol, mx_cutout + cutout_tol, mx_cutout + cutout_tol]);
else if (part == "test_plate_mx_tolerance") test_plate([13.9, 14.0, 14.1], true);
else if (part == "slice_plate_42")        slice_plate(42, keys_42, false);
else if (part == "slice_plate_36")        slice_plate(36, keys_36, false);
else if (part == "slice_plate_42_right")  slice_plate(42, keys_42, true);
else if (part == "slice_tray_42_left")    slice_tray(42, false, pcb_bottom - 1.0);   // through bosses and inserts
else if (part == "slice_tray_36_left")    slice_tray(36, false, pcb_bottom - 1.0);
else if (part == "slice_tray_42_right")   slice_tray(42, true, pcb_bottom - 1.0);
else if (part == "slice_tray_42_left_floor")  slice_tray(42, false, 1.2);            // through the floor
else if (part == "slice_tray_36_left_floor")  slice_tray(36, false, 1.2);
else if (part == "slice_tray_42_right_floor") slice_tray(42, true, 1.2);
else echo("unknown part", part);
